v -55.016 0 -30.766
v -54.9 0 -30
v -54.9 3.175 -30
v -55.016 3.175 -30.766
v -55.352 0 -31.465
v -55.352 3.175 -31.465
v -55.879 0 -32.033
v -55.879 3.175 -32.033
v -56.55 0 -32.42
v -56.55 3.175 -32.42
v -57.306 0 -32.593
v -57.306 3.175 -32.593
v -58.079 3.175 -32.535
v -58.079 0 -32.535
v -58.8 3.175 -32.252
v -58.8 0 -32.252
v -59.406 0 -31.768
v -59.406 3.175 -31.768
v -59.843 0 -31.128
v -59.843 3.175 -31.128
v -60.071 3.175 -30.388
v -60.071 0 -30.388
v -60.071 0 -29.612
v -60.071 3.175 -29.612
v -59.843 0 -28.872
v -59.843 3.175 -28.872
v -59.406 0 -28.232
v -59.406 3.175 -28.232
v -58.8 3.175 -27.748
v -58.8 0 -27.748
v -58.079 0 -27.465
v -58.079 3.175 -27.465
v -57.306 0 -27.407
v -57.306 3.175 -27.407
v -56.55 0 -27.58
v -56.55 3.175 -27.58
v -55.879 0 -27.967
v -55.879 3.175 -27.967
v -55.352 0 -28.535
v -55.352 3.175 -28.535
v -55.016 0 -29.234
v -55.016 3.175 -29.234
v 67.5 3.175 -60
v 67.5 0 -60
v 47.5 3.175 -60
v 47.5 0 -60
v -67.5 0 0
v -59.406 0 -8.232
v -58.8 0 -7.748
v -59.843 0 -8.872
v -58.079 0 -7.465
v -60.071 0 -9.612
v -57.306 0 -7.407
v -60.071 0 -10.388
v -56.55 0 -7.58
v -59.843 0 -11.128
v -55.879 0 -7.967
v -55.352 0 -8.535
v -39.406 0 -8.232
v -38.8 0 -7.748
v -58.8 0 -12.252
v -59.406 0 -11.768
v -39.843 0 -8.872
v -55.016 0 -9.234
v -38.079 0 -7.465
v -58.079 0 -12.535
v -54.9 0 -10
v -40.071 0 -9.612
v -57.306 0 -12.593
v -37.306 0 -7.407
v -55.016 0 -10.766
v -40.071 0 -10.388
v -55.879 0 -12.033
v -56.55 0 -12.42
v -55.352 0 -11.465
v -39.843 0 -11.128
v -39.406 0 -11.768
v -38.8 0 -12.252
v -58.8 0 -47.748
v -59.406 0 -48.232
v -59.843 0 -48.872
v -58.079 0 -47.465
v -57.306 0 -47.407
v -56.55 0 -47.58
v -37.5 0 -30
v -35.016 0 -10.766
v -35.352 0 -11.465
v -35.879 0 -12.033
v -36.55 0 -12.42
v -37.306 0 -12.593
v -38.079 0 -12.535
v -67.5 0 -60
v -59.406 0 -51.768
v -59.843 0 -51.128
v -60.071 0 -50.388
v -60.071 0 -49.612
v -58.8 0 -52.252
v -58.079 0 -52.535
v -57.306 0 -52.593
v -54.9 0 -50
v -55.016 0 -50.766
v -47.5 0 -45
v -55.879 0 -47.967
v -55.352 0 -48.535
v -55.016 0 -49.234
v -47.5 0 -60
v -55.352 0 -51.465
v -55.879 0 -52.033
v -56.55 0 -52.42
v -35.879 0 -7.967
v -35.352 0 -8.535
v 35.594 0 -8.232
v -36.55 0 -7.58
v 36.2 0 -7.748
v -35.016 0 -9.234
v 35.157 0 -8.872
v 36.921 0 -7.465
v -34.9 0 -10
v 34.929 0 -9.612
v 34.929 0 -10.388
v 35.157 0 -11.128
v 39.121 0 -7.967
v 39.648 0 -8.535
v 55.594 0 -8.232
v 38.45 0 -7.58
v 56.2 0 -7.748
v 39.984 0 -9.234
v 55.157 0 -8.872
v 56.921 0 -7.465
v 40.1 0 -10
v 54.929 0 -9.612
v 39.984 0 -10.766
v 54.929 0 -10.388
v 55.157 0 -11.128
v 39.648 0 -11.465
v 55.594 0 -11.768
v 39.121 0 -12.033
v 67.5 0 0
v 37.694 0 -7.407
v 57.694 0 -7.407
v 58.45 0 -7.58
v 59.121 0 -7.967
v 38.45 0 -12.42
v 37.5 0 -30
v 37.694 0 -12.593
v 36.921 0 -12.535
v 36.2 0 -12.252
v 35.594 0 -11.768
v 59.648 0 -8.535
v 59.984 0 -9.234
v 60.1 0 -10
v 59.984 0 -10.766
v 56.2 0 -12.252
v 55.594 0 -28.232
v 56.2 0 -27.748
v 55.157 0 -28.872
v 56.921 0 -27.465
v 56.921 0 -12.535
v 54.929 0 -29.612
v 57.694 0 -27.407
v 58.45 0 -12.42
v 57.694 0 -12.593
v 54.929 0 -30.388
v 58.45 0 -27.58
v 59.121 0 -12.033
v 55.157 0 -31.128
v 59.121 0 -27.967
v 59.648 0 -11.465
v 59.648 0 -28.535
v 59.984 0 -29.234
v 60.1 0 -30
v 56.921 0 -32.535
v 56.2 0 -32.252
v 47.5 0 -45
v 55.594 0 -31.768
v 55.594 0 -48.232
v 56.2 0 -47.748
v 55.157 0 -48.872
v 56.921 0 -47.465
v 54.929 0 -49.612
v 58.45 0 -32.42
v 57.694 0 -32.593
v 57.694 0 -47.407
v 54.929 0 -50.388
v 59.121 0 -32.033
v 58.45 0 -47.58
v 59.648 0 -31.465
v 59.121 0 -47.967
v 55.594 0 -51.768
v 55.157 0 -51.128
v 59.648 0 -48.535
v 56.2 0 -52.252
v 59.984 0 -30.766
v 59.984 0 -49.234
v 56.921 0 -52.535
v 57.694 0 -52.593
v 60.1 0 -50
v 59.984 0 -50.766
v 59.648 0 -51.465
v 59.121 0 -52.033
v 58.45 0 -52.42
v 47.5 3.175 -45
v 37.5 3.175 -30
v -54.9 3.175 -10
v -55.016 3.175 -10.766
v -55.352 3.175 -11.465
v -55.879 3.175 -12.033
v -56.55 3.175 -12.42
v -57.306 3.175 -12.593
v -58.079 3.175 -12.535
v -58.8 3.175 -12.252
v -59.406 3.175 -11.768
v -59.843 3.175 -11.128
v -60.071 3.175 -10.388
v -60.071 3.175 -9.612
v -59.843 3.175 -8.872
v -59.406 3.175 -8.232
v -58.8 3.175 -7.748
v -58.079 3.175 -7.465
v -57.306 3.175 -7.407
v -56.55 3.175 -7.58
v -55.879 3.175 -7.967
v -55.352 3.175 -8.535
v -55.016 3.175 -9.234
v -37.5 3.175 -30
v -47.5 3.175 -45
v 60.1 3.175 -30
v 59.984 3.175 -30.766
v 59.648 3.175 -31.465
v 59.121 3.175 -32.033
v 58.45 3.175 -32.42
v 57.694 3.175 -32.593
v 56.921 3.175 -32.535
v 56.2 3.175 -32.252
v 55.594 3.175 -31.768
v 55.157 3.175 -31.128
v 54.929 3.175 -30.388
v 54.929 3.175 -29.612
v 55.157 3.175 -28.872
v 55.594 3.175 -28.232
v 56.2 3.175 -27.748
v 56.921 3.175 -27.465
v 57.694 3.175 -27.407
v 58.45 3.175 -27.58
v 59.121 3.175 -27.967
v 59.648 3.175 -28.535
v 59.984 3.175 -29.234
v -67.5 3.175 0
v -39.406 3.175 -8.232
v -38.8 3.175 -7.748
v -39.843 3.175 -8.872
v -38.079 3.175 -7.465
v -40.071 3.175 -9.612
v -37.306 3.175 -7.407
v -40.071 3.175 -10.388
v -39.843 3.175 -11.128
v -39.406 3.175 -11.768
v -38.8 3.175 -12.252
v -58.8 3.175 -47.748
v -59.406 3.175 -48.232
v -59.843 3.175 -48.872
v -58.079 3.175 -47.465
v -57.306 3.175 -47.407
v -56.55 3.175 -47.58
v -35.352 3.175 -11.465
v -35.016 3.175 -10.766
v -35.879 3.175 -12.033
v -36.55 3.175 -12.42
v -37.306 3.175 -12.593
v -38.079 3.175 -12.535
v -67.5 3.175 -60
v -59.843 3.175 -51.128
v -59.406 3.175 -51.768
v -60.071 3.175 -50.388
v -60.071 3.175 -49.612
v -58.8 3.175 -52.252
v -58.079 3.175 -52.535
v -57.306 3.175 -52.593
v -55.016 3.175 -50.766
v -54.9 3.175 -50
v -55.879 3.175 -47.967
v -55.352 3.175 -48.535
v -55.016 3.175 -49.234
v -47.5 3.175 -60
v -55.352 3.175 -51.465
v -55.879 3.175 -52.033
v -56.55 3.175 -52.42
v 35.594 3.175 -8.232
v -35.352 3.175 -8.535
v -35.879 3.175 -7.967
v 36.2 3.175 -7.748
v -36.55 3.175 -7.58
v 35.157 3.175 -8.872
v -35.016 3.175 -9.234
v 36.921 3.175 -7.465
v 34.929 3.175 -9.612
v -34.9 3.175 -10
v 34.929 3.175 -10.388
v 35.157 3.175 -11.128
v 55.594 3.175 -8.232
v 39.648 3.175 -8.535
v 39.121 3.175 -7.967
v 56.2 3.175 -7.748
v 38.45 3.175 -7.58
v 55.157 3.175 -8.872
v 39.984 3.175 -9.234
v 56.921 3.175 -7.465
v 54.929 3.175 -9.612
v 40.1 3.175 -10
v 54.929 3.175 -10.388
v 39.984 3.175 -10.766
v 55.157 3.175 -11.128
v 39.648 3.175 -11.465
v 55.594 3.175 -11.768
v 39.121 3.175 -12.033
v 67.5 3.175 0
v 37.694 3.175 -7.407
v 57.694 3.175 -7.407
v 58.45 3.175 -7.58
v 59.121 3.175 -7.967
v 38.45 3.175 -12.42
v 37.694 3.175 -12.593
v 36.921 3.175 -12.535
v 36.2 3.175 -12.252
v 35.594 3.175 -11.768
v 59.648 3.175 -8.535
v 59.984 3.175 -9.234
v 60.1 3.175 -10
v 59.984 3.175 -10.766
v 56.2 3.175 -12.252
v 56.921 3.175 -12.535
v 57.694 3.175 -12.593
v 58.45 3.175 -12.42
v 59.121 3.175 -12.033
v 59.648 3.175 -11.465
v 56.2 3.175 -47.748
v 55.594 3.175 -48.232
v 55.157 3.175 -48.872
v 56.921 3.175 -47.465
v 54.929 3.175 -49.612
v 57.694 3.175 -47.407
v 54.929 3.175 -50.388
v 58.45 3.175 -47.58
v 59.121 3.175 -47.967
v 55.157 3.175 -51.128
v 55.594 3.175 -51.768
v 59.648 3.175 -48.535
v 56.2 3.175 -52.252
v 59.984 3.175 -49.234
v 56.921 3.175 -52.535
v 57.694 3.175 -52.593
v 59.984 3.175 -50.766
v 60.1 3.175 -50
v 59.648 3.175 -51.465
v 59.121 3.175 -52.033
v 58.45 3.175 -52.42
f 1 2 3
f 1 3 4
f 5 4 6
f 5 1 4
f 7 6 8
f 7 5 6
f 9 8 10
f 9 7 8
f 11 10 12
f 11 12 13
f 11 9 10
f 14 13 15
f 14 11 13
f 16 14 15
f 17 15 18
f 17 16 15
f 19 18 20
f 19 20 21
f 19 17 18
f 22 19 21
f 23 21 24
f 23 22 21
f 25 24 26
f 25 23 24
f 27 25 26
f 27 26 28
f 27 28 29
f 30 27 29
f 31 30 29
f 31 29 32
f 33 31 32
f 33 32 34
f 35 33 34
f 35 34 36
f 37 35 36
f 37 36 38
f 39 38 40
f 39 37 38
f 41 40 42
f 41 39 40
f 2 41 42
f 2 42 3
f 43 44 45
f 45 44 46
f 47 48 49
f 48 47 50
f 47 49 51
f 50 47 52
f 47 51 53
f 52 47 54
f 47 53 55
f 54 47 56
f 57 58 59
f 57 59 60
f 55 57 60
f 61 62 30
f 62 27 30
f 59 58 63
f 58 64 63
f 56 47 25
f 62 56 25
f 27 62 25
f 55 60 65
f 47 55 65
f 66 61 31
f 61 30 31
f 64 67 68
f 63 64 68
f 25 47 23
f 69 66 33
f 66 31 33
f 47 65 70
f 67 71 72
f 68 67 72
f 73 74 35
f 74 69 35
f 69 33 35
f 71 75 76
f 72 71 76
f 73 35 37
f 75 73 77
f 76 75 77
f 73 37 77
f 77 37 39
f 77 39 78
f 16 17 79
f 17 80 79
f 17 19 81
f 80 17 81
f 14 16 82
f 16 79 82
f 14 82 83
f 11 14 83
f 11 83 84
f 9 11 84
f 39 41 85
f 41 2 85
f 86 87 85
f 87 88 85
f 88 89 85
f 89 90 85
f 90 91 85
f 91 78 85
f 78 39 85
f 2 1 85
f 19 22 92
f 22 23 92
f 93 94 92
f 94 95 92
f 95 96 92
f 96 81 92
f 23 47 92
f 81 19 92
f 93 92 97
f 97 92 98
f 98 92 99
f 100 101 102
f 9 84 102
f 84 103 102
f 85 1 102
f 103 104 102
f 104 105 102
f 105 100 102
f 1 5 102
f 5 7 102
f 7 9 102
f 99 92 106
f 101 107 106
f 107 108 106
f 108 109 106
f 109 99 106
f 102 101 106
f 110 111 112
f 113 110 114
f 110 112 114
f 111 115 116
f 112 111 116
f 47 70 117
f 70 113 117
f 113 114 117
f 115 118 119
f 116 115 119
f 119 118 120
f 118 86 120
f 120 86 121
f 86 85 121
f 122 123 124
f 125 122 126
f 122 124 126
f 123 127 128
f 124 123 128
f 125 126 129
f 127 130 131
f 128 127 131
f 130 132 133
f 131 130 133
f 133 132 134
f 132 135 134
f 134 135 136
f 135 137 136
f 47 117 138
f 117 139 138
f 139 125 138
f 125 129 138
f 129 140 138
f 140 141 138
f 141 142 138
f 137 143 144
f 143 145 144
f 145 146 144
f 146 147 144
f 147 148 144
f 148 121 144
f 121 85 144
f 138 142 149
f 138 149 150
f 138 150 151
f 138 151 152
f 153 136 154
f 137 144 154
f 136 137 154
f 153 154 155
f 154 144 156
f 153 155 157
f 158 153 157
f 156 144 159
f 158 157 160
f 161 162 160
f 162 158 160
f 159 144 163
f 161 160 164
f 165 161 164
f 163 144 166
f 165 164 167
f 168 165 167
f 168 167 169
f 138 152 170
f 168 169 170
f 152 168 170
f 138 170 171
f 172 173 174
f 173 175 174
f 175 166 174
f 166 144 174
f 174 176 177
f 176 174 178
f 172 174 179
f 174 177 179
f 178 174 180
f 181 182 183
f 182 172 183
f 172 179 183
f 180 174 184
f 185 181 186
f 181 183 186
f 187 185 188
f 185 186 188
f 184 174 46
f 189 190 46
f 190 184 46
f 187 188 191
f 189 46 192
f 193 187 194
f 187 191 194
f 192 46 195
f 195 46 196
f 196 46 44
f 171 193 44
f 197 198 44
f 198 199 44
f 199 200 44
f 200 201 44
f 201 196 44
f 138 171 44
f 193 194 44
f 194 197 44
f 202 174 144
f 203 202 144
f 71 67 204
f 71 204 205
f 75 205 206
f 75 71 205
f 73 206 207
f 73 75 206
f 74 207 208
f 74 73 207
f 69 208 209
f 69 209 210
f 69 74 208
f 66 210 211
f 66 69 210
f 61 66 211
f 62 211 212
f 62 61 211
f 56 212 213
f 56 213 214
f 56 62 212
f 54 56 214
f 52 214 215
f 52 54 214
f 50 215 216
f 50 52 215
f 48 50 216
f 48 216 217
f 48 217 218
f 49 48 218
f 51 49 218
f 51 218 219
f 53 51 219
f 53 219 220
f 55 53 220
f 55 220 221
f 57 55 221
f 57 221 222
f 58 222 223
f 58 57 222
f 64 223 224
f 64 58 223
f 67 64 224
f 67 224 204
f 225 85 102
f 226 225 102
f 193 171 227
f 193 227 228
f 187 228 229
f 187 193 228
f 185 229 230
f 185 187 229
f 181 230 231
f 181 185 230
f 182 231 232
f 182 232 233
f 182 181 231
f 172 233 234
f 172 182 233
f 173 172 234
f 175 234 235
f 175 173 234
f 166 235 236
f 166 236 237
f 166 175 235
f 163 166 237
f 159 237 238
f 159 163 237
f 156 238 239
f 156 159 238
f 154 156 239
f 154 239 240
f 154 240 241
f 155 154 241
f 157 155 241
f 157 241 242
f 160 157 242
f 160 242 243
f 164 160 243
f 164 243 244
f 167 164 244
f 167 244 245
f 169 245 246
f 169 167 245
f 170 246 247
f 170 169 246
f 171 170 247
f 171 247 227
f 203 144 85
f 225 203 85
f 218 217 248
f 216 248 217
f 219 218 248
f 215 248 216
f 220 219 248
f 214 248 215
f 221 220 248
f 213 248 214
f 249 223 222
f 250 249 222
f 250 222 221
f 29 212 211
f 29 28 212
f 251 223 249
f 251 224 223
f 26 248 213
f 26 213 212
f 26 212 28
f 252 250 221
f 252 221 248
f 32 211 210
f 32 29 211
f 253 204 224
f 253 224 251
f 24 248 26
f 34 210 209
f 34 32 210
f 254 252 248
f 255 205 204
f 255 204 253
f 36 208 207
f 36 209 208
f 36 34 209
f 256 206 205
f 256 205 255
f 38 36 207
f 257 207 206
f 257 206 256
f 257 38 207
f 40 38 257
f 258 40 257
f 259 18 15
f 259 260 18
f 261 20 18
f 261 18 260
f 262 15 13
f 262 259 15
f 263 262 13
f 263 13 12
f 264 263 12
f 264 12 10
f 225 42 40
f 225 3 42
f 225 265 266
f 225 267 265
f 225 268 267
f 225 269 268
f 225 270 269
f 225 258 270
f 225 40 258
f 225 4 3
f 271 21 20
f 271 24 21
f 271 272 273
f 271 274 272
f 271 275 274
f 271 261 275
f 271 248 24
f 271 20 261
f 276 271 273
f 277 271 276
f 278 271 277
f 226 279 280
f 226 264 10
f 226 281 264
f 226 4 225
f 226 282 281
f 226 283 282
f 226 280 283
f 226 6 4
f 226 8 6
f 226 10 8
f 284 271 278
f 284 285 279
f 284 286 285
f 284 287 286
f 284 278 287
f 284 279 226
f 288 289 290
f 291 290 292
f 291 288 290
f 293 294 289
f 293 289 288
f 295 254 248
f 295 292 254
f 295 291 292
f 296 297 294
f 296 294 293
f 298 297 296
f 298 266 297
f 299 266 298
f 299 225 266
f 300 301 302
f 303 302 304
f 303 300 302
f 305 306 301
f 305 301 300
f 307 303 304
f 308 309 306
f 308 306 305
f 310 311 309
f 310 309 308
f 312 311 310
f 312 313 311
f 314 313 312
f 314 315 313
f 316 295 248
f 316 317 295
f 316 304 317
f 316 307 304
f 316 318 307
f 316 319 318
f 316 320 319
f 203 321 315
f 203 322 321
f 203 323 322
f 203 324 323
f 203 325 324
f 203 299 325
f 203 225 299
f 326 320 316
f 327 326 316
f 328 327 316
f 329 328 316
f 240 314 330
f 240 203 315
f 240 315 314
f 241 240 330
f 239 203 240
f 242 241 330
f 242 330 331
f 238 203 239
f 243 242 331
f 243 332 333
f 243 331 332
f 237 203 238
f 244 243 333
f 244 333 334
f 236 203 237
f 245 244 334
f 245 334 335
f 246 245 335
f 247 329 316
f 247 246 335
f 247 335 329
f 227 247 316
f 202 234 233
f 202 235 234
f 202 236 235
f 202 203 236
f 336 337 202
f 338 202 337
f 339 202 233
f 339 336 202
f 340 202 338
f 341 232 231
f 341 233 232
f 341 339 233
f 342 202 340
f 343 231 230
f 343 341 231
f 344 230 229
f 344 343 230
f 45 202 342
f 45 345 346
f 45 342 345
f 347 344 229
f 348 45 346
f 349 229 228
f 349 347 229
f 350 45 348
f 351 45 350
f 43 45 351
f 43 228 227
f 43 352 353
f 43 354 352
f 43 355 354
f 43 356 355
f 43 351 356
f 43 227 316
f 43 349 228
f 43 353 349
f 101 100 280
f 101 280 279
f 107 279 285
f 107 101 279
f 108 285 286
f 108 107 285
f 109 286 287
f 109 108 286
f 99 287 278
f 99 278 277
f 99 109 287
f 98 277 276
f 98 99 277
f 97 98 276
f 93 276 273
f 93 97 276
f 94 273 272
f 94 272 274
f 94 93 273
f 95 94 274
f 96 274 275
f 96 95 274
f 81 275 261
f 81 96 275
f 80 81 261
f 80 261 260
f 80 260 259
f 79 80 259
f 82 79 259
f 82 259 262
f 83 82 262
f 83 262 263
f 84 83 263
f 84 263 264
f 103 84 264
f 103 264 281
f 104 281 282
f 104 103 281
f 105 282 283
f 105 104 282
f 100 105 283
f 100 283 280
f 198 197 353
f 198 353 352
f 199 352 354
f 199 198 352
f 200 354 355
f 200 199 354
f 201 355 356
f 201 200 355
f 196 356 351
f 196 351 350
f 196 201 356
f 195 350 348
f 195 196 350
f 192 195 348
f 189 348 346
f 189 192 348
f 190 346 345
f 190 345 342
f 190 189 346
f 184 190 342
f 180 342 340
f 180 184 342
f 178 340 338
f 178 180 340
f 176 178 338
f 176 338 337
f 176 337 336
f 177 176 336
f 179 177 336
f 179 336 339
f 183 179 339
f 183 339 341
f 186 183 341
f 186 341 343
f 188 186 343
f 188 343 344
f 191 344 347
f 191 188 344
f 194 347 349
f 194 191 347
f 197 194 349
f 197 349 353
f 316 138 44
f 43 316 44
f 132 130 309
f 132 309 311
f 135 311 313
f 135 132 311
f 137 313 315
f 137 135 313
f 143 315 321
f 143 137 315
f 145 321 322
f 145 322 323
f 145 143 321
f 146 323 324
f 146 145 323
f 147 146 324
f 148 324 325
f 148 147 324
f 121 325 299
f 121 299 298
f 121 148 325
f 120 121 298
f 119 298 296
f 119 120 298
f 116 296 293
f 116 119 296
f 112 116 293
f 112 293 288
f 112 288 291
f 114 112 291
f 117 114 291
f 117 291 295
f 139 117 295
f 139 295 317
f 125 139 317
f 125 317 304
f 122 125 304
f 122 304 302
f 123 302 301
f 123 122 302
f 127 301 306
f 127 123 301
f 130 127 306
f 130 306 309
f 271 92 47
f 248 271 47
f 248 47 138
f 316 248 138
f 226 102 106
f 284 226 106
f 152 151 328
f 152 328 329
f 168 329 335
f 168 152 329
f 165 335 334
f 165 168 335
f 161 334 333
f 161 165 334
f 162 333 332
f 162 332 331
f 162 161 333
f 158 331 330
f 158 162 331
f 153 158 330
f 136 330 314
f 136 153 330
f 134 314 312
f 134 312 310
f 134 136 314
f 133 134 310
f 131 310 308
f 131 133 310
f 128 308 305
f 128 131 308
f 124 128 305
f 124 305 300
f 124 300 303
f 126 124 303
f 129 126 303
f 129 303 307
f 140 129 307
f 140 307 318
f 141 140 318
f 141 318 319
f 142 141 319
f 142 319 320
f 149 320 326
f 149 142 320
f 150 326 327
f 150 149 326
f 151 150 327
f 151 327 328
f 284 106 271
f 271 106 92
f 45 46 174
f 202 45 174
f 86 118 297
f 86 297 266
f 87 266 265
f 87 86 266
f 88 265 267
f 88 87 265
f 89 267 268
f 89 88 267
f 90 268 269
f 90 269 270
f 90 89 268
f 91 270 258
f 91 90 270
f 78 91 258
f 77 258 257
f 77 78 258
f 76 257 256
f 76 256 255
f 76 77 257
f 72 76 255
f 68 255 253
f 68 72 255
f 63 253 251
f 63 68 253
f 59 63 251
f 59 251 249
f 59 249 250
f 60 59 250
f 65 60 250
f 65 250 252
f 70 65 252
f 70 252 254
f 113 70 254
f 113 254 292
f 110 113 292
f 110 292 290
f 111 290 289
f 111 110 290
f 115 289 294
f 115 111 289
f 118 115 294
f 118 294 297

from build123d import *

# Parameters (mm, degrees)
SKETCH1_R           = 2.6
BOSS_EXTRUDE1_DEPTH = 3.175


with BuildPart() as part:
    # Sketch1 → Boss-Extrude1 (new body)
    with BuildSketch(Plane(origin=(0, 0, 0), x_dir=(1, 0, 0), z_dir=(0, 1, 0))):
        Polygon((47.5, 45), (37.5, 30), (-37.5, 30), (-47.5, 45), (-47.5, 60), (-67.5, 60), (-67.5, 0), (67.5, 0), (67.5, 60), (47.5, 60), align=None)
        with Locations((-37.5, 10)):
            Circle(SKETCH1_R, mode=Mode.SUBTRACT)
        with Locations((-57.5, 10)):
            Circle(SKETCH1_R, mode=Mode.SUBTRACT)
        with Locations((-57.5, 30)):
            Circle(SKETCH1_R, mode=Mode.SUBTRACT)
        with Locations((-57.5, 50)):
            Circle(SKETCH1_R, mode=Mode.SUBTRACT)
        with Locations((57.5, 50)):
            Circle(SKETCH1_R, mode=Mode.SUBTRACT)
        with Locations((57.5, 30)):
            Circle(SKETCH1_R, mode=Mode.SUBTRACT)
        with Locations((57.5, 10)):
            Circle(SKETCH1_R, mode=Mode.SUBTRACT)
        with Locations((37.5, 10)):
            Circle(SKETCH1_R, mode=Mode.SUBTRACT)
    extrude(amount=BOSS_EXTRUDE1_DEPTH)


solid = part.part
